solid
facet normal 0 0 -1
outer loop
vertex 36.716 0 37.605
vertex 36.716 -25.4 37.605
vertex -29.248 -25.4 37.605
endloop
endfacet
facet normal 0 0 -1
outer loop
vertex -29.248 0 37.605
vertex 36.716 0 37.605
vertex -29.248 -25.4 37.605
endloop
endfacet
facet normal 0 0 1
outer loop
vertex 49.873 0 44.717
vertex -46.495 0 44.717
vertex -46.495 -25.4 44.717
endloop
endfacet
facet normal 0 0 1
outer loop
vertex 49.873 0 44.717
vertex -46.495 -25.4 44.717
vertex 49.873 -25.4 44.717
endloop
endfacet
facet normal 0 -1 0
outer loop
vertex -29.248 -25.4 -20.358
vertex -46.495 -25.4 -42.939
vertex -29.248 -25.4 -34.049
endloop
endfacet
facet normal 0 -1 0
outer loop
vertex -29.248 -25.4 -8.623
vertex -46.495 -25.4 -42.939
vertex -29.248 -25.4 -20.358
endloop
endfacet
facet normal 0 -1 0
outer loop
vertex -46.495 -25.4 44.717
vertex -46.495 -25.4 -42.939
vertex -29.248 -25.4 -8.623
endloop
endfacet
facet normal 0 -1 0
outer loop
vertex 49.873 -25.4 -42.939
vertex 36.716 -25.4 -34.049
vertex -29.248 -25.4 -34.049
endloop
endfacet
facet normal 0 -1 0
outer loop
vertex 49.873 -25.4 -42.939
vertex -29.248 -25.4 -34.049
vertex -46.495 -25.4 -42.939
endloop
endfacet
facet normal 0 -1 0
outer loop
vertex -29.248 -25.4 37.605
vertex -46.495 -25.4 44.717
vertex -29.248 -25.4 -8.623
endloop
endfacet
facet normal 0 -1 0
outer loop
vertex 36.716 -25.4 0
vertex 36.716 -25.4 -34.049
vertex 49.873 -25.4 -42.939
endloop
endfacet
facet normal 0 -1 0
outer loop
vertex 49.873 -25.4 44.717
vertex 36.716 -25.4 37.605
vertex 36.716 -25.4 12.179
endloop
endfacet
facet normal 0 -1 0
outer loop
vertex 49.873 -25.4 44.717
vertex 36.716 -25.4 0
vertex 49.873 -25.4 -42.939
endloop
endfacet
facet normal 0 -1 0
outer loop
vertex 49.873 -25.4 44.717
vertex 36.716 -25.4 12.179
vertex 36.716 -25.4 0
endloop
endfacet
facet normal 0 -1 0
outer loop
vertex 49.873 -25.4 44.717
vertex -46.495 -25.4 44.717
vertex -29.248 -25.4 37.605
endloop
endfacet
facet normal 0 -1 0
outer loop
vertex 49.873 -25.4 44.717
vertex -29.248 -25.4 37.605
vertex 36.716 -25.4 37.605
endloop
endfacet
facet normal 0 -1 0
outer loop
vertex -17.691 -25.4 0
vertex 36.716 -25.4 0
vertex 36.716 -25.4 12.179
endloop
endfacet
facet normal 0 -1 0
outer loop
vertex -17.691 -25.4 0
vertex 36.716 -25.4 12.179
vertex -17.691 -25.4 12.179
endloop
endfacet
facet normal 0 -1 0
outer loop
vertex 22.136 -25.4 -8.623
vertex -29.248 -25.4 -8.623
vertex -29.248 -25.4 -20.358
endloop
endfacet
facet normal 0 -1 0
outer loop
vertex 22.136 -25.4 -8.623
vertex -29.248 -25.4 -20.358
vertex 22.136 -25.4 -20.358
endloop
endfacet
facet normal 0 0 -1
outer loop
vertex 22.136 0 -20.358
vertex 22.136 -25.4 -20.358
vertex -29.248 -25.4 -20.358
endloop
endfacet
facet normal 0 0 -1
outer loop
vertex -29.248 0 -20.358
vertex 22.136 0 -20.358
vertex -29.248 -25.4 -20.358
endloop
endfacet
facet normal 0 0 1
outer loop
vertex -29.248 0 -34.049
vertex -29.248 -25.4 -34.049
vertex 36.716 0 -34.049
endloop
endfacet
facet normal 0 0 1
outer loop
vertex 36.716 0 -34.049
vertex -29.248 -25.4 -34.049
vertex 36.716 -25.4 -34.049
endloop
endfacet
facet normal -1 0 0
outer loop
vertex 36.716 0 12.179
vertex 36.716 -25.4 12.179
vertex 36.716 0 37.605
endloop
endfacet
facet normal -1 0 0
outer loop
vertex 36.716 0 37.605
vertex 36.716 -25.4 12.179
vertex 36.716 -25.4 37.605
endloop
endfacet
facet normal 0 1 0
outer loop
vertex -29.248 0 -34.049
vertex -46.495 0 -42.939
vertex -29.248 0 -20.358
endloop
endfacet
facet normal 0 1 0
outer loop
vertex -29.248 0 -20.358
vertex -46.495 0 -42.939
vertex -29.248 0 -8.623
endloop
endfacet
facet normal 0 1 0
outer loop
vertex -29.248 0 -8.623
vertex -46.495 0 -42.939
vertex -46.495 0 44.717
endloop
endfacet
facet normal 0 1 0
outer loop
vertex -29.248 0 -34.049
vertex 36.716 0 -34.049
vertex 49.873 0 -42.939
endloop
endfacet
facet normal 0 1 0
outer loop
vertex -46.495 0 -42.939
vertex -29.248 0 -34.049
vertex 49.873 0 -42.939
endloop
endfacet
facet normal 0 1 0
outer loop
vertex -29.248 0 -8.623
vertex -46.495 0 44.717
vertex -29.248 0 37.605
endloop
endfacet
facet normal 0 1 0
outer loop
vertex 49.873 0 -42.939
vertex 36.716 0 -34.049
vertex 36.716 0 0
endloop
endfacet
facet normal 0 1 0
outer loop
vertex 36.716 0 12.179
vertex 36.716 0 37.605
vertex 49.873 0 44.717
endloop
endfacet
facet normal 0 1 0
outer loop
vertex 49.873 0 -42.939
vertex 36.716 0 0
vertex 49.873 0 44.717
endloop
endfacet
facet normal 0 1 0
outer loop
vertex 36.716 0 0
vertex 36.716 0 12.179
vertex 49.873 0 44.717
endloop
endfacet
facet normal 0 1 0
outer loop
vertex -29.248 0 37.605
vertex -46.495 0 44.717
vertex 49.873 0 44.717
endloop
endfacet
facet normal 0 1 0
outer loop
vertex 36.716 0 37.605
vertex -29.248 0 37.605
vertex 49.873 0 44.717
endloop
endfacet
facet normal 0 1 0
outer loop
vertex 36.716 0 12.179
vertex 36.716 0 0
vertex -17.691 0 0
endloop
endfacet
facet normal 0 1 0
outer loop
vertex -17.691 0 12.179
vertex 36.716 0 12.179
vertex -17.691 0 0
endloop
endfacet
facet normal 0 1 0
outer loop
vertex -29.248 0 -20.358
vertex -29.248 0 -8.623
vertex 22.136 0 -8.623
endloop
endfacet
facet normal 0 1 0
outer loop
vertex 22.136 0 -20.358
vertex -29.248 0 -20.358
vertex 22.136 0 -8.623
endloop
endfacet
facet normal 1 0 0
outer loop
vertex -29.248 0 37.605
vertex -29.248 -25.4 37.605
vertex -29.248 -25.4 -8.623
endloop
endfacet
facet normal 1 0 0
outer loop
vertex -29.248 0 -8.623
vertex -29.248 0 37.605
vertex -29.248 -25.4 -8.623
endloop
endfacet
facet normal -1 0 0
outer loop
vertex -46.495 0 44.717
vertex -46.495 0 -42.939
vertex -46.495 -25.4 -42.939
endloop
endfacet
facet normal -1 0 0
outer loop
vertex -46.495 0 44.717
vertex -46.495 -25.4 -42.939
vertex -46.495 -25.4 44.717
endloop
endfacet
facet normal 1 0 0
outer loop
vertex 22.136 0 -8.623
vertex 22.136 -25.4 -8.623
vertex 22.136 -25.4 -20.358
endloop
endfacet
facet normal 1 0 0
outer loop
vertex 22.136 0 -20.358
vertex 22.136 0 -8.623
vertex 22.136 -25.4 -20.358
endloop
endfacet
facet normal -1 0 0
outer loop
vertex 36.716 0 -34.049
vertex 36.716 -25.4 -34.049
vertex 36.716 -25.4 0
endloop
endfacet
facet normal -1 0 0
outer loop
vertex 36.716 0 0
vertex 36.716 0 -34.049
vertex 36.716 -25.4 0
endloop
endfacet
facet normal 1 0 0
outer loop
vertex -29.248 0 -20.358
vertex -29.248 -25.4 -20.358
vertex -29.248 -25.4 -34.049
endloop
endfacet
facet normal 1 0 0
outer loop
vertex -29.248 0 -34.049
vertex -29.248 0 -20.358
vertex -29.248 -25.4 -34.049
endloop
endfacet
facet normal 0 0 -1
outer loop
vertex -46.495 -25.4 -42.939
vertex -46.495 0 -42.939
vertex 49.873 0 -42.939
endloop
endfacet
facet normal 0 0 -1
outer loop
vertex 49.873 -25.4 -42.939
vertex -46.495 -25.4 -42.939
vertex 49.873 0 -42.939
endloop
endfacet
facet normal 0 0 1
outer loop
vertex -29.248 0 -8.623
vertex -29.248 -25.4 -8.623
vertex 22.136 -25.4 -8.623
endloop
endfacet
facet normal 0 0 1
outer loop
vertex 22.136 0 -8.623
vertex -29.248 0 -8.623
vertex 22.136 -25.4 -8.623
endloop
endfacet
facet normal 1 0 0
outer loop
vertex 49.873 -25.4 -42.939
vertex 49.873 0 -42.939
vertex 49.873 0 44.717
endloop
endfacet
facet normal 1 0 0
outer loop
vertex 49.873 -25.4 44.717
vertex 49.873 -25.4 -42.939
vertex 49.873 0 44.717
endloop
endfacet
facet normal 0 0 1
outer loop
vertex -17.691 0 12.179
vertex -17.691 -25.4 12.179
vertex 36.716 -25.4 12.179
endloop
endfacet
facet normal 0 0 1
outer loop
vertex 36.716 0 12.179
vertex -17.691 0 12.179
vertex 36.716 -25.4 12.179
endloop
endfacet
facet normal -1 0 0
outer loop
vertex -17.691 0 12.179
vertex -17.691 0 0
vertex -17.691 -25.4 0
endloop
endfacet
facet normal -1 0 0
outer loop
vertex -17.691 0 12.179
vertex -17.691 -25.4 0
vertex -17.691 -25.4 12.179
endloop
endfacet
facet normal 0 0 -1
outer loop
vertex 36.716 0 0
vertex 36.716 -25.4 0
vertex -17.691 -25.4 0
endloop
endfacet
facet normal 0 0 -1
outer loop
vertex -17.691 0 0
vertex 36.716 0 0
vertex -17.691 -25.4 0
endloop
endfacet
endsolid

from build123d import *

# Parameters (mm, degrees)
F0_W     = 96.367601
F0_H     = 87.655403
F1_DEPTH = 25.4
F4_DEPTH = 25.4


with BuildPart() as f1:
    # F0 (on Front) → F1 (new body)
    with BuildSketch(Plane.XZ):
        with Locations((1.689101, 0.889)):
            Rectangle(F0_W, F0_H)
    extrude(amount=F1_DEPTH)

    # F3 (on face) + F2 (on face) → F4 (cut)
    with BuildSketch(Plane.XZ.offset(25.4)):
        Polygon((36.715697, 12.179299), (36.715697, 37.604701), (-29.248102, 37.604701), (-29.248102, -8.6233), (22.1361, -8.6233), (22.1361, -20.358101), (-29.248102, -20.358101), (-29.248102, -34.048699), (36.715697, -34.048699), (36.715697, 0), (-17.6911, 0), (-17.6911, 12.179299), align=None)
    with BuildSketch(Plane.XZ.offset(25.4)):
        Polygon((36.715697, 37.604701), (-29.248102, 37.604701), (-29.248102, -8.6233), (22.1361, -8.6233), (22.1361, -20.358101), (-29.248102, -20.358101), (-29.248102, -34.048699), (36.715697, -34.048699), (36.715697, 0), (-17.6911, 0), (-17.6911, 12.179299), (36.715697, 12.179299), align=None)
    extrude(amount=-F4_DEPTH, mode=Mode.SUBTRACT)


solid = f1.part
